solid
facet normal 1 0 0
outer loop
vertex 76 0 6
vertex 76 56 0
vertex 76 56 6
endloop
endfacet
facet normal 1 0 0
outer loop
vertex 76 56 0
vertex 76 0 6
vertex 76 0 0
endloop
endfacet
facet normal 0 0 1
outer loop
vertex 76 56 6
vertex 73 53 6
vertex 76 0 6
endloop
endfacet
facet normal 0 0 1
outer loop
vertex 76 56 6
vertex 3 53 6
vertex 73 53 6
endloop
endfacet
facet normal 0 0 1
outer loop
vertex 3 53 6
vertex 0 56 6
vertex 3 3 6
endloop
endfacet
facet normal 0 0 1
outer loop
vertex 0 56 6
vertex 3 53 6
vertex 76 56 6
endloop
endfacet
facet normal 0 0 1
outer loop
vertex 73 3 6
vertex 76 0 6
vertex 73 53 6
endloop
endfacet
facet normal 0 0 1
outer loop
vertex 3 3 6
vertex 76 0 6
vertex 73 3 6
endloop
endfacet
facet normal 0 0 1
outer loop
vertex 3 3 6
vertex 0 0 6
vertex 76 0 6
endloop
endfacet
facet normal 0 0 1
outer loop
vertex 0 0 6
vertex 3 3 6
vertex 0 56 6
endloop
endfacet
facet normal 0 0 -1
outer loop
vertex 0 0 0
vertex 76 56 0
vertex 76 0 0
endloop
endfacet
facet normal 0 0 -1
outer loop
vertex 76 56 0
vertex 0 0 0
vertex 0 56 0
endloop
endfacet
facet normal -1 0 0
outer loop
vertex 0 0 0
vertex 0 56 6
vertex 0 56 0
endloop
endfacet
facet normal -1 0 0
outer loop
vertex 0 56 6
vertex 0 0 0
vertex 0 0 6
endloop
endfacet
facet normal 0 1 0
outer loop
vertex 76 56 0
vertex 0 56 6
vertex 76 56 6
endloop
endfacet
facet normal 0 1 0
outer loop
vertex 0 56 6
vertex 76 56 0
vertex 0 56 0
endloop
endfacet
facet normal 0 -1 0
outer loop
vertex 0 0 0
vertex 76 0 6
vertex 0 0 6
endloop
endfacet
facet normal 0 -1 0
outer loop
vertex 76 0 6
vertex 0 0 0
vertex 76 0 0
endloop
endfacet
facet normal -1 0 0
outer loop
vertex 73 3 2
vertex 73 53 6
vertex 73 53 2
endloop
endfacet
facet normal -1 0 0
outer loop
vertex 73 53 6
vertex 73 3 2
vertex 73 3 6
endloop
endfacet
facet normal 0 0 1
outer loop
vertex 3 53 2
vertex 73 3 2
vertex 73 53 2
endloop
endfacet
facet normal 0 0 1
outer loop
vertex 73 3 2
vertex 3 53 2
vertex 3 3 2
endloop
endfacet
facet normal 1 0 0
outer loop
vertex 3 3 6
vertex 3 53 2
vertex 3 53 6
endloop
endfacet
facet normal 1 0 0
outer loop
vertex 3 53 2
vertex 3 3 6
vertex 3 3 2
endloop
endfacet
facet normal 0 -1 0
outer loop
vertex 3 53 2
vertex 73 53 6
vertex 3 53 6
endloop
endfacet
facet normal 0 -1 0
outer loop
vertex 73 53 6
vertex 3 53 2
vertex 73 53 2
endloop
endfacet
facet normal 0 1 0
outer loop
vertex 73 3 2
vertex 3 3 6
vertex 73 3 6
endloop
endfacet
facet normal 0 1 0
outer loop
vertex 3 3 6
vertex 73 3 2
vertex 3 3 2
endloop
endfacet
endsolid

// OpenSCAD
module pcb_holder(w=70,d=50,t=2){
  difference(){
    cube([w+6,d+6,t+4]);
    translate([3,3,t]) cube([w,d,5]);
  }
}
pcb_holder();
